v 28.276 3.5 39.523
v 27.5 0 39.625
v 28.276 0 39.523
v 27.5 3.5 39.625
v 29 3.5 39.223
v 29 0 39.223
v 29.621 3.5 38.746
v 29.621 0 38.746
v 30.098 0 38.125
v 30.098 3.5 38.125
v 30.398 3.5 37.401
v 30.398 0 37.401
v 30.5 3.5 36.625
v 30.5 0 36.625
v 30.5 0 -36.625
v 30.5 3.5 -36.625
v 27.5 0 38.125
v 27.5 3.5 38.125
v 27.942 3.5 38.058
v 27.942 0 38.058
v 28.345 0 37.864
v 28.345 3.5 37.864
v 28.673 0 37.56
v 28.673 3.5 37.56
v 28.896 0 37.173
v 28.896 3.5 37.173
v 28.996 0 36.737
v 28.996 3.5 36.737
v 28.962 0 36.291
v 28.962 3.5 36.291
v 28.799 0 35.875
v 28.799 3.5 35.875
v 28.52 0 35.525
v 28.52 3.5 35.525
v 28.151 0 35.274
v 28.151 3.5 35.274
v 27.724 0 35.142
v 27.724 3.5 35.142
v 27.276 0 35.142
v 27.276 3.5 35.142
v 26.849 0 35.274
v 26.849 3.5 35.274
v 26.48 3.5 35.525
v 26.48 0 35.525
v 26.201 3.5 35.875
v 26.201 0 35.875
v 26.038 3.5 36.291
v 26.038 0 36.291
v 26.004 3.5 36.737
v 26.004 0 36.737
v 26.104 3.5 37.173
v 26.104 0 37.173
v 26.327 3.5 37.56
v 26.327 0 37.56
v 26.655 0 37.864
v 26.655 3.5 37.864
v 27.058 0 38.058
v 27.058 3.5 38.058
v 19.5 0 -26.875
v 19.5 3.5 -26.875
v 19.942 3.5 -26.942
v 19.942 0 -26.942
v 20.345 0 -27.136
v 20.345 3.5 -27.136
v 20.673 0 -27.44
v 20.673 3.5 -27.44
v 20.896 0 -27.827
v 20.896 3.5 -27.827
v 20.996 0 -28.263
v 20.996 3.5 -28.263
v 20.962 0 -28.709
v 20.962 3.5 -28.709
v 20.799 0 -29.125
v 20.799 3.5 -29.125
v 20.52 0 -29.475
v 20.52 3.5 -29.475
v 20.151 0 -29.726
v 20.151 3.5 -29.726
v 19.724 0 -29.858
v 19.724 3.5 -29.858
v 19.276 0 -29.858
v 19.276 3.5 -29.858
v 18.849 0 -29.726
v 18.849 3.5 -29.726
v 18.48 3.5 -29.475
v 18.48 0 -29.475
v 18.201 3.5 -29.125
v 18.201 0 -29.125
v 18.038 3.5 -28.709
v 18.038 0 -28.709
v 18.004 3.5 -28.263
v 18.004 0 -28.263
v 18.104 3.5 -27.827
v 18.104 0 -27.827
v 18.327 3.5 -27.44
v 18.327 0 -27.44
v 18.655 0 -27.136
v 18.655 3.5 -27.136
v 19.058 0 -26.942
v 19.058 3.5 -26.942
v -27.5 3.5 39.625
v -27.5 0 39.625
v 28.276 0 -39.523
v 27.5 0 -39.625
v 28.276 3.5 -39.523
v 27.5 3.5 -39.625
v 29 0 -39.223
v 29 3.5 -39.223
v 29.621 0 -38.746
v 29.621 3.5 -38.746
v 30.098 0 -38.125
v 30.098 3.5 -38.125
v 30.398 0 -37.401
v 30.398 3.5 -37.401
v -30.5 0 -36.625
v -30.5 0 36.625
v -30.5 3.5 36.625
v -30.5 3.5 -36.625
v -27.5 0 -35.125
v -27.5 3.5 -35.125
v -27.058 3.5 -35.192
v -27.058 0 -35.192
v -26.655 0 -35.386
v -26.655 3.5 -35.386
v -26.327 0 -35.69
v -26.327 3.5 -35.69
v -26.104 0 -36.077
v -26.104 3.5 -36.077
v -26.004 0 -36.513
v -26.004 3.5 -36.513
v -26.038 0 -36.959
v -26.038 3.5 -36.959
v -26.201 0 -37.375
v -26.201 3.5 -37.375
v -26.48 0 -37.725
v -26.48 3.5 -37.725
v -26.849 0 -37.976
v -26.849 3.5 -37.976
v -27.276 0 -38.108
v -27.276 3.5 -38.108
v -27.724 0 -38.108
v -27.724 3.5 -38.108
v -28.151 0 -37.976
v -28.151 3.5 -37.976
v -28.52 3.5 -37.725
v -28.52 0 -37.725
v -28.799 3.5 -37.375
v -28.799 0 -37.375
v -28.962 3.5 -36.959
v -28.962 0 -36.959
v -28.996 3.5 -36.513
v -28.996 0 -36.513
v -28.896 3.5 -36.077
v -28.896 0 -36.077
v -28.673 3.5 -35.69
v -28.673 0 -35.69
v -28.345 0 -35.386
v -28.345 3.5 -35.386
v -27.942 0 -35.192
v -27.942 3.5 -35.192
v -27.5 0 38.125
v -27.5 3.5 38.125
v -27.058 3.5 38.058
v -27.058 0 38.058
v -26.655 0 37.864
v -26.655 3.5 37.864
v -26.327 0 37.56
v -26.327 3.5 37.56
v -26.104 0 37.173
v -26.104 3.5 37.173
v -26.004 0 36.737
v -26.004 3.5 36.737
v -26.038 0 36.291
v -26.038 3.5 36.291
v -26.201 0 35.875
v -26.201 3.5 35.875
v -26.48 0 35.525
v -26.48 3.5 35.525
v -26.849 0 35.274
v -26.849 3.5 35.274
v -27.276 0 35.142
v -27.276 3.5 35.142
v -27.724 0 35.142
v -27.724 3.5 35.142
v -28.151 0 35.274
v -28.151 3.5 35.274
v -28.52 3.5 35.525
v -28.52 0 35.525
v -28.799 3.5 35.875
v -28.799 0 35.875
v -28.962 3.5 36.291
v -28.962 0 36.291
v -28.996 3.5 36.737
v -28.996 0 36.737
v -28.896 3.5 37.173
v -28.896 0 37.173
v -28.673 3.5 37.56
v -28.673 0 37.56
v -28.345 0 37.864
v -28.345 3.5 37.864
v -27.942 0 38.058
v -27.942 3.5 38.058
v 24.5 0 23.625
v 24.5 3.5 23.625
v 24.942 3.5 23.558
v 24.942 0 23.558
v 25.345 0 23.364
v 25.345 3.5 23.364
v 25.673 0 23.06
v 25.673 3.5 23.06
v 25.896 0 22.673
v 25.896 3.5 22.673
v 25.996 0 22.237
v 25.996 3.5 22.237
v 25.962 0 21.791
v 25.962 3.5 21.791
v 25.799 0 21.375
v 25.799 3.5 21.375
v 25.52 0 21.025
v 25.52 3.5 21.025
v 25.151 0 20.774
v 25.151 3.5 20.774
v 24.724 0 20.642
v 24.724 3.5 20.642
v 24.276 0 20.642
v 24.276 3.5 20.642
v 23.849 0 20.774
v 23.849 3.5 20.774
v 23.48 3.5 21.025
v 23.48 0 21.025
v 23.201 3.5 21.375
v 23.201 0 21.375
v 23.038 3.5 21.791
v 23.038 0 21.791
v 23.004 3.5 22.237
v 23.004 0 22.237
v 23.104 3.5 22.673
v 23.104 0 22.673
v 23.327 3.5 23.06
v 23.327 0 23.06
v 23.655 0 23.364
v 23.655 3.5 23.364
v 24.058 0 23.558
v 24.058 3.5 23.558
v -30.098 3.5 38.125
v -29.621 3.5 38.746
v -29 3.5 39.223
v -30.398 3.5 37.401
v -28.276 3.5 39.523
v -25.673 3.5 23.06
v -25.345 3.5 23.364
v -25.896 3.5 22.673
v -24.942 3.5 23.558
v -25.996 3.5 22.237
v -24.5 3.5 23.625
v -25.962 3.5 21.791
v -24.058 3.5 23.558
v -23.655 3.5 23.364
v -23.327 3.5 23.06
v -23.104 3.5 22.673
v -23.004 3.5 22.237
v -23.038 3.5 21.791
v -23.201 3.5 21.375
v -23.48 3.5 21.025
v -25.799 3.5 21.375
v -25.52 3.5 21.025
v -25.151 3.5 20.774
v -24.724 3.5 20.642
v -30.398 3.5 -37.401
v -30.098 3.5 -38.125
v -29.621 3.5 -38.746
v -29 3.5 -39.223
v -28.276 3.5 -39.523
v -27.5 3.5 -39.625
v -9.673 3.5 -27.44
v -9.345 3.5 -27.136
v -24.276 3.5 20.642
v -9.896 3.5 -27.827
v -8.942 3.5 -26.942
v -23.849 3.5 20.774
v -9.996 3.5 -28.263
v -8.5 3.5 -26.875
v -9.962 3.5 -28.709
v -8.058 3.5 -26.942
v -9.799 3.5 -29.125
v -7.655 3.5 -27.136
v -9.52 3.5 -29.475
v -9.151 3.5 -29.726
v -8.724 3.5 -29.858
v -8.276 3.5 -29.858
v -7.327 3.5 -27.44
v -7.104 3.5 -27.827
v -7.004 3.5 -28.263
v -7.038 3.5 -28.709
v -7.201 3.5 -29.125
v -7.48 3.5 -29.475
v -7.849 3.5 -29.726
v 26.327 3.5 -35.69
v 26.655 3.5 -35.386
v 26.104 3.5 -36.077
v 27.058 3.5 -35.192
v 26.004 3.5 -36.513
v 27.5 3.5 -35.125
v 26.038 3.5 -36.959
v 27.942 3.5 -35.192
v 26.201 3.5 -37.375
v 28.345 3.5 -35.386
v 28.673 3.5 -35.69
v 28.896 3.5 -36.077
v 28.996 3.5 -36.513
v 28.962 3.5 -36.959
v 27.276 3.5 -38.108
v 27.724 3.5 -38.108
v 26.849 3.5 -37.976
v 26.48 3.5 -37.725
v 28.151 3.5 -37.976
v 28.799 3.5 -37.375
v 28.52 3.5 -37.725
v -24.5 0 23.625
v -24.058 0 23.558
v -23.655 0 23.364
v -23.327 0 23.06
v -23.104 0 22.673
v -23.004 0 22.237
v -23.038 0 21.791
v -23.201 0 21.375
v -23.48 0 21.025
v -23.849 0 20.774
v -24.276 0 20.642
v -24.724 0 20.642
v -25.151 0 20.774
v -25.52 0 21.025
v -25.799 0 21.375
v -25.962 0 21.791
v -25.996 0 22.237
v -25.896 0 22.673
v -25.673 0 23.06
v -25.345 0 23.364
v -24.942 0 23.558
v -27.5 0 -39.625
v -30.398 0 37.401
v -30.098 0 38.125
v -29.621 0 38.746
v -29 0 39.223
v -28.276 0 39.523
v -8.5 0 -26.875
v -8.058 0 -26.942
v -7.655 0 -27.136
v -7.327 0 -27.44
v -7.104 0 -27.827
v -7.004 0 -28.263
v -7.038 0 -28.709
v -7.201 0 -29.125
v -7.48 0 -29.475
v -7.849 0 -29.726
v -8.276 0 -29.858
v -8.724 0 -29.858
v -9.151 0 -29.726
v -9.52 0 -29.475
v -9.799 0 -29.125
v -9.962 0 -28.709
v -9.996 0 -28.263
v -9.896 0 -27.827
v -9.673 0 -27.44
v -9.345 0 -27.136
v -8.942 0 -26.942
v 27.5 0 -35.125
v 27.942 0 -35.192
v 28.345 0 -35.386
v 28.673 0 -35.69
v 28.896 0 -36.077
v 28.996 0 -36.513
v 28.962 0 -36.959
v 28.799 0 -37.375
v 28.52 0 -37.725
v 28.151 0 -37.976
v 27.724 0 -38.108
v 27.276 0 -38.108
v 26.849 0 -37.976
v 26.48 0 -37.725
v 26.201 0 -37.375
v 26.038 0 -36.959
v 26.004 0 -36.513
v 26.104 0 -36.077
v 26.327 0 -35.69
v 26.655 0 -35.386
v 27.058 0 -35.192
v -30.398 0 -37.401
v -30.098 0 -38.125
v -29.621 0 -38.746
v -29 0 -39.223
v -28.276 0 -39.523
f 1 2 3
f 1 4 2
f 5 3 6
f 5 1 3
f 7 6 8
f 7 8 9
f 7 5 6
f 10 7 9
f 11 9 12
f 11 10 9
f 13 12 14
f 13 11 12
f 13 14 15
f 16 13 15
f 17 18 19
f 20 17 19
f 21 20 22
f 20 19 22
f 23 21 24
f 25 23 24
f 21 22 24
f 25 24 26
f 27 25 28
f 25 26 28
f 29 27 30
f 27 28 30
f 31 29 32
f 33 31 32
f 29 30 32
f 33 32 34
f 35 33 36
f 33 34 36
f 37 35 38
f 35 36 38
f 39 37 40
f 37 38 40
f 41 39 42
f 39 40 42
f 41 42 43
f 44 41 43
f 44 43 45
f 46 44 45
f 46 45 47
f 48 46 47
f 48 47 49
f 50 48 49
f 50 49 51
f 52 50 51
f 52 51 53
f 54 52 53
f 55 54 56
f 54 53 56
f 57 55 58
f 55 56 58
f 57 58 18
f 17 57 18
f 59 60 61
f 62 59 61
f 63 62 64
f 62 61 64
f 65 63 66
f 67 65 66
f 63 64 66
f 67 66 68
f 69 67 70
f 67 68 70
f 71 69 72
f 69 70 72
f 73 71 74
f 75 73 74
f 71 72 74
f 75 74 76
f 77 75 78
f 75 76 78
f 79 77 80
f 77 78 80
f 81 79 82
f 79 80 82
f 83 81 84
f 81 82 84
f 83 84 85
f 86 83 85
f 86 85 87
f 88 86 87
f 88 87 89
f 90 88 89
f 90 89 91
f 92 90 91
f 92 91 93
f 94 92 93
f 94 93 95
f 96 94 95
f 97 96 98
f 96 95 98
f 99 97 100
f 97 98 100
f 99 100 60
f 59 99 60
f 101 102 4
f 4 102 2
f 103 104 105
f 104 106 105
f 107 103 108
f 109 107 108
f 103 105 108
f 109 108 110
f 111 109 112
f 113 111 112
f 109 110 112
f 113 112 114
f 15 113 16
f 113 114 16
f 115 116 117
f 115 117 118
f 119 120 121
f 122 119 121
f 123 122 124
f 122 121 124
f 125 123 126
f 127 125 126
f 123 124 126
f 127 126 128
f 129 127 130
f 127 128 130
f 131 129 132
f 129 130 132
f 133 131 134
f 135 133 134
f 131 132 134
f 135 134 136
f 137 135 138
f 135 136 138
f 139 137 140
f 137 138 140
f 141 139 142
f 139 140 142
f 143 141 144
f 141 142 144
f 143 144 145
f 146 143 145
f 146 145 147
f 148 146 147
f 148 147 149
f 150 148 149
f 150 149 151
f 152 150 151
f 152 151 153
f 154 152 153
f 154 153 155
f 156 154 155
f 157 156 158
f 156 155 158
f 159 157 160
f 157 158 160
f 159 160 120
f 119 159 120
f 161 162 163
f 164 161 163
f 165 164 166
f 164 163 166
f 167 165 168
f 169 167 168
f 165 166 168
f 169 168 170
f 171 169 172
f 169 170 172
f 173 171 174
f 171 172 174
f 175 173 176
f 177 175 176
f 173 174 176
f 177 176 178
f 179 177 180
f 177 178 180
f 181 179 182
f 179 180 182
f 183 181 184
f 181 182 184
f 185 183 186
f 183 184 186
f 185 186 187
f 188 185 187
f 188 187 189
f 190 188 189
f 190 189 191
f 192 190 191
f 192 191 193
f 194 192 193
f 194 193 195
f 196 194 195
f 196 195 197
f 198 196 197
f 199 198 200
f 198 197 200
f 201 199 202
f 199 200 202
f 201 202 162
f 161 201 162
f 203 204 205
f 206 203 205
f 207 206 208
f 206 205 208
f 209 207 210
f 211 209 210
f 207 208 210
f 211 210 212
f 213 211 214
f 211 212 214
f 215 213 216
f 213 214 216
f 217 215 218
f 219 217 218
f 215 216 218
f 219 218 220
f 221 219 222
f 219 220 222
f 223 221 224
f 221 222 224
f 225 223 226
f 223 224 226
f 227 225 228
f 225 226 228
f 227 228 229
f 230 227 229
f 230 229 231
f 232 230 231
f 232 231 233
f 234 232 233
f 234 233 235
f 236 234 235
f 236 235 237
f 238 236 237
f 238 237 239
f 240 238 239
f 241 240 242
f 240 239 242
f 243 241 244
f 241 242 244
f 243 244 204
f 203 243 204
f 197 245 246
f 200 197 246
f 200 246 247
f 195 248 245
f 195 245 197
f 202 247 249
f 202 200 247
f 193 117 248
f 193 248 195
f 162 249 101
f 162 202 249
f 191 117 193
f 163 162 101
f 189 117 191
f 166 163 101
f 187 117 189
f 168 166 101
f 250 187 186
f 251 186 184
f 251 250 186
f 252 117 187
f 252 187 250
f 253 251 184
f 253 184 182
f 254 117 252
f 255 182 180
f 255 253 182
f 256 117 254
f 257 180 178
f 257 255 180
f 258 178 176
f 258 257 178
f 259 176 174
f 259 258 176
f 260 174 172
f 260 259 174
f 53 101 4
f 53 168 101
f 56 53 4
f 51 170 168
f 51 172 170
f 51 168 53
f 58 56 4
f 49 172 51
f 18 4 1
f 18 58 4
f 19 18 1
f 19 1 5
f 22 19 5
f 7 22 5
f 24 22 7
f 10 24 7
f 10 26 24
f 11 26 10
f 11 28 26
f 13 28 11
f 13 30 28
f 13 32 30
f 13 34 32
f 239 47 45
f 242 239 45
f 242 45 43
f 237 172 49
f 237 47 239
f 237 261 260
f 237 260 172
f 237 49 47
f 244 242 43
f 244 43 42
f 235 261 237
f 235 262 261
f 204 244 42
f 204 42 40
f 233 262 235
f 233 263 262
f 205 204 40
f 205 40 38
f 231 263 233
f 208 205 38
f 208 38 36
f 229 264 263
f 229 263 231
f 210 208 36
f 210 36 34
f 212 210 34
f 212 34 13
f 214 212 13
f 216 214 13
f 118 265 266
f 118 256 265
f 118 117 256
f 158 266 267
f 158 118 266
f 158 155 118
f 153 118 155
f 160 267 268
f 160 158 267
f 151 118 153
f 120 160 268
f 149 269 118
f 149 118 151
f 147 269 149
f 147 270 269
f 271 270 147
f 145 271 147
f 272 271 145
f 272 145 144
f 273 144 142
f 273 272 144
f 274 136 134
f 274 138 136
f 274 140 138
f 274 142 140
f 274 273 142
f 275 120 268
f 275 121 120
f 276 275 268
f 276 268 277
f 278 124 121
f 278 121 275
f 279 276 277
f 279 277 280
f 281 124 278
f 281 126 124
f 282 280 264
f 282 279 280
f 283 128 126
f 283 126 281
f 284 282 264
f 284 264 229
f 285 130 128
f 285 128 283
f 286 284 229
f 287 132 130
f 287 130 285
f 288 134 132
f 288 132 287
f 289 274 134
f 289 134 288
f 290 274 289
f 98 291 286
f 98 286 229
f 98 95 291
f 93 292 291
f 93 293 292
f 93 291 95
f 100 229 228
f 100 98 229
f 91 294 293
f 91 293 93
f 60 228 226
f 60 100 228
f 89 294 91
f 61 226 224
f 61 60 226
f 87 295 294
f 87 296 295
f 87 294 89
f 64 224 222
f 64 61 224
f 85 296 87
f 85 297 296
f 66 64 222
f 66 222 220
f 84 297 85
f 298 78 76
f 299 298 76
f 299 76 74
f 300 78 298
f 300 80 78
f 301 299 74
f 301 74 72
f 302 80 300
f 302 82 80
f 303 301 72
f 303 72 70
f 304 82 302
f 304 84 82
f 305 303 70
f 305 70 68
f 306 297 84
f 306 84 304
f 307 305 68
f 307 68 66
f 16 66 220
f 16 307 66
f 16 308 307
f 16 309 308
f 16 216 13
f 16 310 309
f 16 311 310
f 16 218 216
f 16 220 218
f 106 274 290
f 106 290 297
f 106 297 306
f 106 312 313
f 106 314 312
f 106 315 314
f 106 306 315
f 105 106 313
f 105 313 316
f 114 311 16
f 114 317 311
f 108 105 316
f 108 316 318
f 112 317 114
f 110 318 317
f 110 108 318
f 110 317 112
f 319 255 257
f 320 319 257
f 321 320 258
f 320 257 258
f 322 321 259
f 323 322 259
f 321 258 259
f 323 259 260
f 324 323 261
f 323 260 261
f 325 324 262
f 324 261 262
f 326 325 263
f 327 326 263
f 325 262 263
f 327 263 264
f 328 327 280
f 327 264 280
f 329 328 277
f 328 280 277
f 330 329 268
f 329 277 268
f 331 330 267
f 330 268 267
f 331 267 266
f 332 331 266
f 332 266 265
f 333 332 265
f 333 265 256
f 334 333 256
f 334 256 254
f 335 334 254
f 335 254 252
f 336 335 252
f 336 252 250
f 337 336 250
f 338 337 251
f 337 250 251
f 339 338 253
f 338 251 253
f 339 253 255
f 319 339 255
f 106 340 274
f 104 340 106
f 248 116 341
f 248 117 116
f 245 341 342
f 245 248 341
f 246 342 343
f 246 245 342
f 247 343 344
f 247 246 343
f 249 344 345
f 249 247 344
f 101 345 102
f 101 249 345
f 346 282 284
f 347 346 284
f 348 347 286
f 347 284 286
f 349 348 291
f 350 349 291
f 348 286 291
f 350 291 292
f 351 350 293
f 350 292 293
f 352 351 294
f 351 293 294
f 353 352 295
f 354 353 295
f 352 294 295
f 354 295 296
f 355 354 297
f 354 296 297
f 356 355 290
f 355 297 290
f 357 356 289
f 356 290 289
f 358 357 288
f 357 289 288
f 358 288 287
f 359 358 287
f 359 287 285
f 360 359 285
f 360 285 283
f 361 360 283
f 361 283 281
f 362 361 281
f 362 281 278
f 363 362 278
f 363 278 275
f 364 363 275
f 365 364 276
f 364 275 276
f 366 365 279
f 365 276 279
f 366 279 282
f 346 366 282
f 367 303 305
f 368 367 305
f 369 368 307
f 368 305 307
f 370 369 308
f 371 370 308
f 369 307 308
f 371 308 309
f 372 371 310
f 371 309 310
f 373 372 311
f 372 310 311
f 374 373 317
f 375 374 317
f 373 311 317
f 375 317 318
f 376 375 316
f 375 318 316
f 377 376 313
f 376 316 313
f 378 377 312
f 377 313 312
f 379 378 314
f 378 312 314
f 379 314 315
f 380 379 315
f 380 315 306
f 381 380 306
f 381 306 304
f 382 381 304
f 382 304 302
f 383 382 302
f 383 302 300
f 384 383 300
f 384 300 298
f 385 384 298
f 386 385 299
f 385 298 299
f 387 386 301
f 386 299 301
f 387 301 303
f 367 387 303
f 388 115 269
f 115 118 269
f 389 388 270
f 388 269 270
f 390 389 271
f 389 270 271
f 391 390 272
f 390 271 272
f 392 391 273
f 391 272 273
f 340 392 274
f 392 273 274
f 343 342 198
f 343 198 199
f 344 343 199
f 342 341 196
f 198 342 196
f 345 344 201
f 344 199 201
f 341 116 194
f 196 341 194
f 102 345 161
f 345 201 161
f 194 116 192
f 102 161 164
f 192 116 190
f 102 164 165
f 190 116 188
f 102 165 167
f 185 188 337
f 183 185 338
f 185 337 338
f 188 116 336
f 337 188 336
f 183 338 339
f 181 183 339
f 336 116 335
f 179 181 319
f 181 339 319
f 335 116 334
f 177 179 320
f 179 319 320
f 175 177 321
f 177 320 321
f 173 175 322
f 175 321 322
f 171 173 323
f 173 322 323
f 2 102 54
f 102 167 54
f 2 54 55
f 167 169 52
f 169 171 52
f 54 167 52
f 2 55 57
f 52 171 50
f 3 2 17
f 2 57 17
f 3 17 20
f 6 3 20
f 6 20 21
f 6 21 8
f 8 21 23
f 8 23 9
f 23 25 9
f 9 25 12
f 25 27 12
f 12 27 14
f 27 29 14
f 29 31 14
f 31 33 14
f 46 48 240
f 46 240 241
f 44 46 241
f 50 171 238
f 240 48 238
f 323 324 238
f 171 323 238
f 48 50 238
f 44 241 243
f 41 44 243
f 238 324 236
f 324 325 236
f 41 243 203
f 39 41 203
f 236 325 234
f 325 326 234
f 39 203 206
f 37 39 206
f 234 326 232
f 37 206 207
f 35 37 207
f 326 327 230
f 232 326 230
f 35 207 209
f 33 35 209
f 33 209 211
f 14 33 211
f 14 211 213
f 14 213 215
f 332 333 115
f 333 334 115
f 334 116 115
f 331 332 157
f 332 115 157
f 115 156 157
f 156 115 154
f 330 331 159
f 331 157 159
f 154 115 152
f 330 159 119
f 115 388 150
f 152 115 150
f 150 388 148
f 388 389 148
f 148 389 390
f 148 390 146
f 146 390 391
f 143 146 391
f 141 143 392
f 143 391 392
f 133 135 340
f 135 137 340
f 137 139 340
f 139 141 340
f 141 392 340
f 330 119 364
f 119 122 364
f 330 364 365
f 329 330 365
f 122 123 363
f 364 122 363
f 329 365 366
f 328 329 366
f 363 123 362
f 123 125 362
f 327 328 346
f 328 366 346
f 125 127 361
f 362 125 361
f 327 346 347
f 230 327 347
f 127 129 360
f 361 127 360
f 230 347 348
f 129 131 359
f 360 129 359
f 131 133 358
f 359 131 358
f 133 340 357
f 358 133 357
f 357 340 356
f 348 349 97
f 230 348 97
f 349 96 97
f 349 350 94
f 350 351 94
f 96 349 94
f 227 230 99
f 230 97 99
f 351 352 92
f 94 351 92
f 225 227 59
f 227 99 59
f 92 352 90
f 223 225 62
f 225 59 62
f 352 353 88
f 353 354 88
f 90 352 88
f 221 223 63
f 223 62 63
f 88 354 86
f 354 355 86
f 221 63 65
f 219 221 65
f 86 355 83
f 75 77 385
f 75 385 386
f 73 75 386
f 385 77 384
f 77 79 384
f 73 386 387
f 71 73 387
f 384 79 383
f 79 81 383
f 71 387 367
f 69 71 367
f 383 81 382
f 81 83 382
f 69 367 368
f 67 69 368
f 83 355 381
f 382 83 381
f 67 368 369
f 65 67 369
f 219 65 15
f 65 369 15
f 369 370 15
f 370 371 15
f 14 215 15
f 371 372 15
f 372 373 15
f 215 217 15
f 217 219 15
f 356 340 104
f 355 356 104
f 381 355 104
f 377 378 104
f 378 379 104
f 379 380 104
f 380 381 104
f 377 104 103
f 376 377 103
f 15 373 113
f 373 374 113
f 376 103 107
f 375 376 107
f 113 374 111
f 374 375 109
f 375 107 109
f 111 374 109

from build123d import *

# Parameters (mm, degrees)
SKETCH1_W           = 61
SKETCH1_H           = 79.25
BOSS_EXTRUDE1_DEPTH = 3.5
SKETCH2_R           = 1.5
CUT_EXTRUDE1_DEPTH  = 3.5
FILLET1_R           = 3
SKETCH3_R           = 1.5
CUT_EXTRUDE2_DEPTH  = 3.5


with BuildPart() as part:
    # Sketch1 → Boss-Extrude1 (new body)
    with BuildSketch(Plane(origin=(0, 0, 0), x_dir=(1, 0, 0), z_dir=(0, 1, 0))):
        Rectangle(SKETCH1_W, SKETCH1_H)
    extrude(amount=BOSS_EXTRUDE1_DEPTH)

    # Sketch2 → Cut-Extrude1 (cut)
    with BuildSketch(Plane(origin=(0, 3.5, 0), x_dir=(1, 0, 0), z_dir=(0, 1, 0))):
        with Locations(Location((-27.5, 36.625, 0), (0, 0, 270))):
            Circle(SKETCH2_R)
        with Locations(Location((27.5, 36.625, 0), (0, 0, 270))):
            Circle(SKETCH2_R)
        with Locations(Location((-27.5, -36.625, 0), (0, 0, 270))):
            Circle(SKETCH2_R)
        with Locations(Location((27.5, -36.625, 0), (0, 0, 270))):
            Circle(SKETCH2_R)
    extrude(amount=-CUT_EXTRUDE1_DEPTH, mode=Mode.SUBTRACT)

    # Fillet1
    fillet1_edges = [part.edges().sort_by_distance(p)[0] for p in [
        (30.5, 1.75, 39.625),
        (-30.5, 1.75, 39.625),
        (-30.5, 1.75, -39.625),
        (30.5, 1.75, -39.625),
    ]]
    fillet(fillet1_edges, radius=FILLET1_R)

    # Sketch3 → Cut-Extrude2 (cut)
    with BuildSketch(Plane(origin=(0, 3.5, 0), x_dir=(1, 0, 0), z_dir=(0, 1, 0))):
        with Locations(Location((-24.5, -22.125, 0), (0, 0, 270))):
            Circle(SKETCH3_R)
        with Locations(Location((24.5, -22.125, 0), (0, 0, 270))):
            Circle(SKETCH3_R)
        with Locations(Location((19.5, 28.375, 0), (0, 0, 270))):
            Circle(SKETCH3_R)
        with Locations(Location((-8.5, 28.375, 0), (0, 0, 270))):
            Circle(SKETCH3_R)
    extrude(amount=-CUT_EXTRUDE2_DEPTH, mode=Mode.SUBTRACT)


solid = part.part
